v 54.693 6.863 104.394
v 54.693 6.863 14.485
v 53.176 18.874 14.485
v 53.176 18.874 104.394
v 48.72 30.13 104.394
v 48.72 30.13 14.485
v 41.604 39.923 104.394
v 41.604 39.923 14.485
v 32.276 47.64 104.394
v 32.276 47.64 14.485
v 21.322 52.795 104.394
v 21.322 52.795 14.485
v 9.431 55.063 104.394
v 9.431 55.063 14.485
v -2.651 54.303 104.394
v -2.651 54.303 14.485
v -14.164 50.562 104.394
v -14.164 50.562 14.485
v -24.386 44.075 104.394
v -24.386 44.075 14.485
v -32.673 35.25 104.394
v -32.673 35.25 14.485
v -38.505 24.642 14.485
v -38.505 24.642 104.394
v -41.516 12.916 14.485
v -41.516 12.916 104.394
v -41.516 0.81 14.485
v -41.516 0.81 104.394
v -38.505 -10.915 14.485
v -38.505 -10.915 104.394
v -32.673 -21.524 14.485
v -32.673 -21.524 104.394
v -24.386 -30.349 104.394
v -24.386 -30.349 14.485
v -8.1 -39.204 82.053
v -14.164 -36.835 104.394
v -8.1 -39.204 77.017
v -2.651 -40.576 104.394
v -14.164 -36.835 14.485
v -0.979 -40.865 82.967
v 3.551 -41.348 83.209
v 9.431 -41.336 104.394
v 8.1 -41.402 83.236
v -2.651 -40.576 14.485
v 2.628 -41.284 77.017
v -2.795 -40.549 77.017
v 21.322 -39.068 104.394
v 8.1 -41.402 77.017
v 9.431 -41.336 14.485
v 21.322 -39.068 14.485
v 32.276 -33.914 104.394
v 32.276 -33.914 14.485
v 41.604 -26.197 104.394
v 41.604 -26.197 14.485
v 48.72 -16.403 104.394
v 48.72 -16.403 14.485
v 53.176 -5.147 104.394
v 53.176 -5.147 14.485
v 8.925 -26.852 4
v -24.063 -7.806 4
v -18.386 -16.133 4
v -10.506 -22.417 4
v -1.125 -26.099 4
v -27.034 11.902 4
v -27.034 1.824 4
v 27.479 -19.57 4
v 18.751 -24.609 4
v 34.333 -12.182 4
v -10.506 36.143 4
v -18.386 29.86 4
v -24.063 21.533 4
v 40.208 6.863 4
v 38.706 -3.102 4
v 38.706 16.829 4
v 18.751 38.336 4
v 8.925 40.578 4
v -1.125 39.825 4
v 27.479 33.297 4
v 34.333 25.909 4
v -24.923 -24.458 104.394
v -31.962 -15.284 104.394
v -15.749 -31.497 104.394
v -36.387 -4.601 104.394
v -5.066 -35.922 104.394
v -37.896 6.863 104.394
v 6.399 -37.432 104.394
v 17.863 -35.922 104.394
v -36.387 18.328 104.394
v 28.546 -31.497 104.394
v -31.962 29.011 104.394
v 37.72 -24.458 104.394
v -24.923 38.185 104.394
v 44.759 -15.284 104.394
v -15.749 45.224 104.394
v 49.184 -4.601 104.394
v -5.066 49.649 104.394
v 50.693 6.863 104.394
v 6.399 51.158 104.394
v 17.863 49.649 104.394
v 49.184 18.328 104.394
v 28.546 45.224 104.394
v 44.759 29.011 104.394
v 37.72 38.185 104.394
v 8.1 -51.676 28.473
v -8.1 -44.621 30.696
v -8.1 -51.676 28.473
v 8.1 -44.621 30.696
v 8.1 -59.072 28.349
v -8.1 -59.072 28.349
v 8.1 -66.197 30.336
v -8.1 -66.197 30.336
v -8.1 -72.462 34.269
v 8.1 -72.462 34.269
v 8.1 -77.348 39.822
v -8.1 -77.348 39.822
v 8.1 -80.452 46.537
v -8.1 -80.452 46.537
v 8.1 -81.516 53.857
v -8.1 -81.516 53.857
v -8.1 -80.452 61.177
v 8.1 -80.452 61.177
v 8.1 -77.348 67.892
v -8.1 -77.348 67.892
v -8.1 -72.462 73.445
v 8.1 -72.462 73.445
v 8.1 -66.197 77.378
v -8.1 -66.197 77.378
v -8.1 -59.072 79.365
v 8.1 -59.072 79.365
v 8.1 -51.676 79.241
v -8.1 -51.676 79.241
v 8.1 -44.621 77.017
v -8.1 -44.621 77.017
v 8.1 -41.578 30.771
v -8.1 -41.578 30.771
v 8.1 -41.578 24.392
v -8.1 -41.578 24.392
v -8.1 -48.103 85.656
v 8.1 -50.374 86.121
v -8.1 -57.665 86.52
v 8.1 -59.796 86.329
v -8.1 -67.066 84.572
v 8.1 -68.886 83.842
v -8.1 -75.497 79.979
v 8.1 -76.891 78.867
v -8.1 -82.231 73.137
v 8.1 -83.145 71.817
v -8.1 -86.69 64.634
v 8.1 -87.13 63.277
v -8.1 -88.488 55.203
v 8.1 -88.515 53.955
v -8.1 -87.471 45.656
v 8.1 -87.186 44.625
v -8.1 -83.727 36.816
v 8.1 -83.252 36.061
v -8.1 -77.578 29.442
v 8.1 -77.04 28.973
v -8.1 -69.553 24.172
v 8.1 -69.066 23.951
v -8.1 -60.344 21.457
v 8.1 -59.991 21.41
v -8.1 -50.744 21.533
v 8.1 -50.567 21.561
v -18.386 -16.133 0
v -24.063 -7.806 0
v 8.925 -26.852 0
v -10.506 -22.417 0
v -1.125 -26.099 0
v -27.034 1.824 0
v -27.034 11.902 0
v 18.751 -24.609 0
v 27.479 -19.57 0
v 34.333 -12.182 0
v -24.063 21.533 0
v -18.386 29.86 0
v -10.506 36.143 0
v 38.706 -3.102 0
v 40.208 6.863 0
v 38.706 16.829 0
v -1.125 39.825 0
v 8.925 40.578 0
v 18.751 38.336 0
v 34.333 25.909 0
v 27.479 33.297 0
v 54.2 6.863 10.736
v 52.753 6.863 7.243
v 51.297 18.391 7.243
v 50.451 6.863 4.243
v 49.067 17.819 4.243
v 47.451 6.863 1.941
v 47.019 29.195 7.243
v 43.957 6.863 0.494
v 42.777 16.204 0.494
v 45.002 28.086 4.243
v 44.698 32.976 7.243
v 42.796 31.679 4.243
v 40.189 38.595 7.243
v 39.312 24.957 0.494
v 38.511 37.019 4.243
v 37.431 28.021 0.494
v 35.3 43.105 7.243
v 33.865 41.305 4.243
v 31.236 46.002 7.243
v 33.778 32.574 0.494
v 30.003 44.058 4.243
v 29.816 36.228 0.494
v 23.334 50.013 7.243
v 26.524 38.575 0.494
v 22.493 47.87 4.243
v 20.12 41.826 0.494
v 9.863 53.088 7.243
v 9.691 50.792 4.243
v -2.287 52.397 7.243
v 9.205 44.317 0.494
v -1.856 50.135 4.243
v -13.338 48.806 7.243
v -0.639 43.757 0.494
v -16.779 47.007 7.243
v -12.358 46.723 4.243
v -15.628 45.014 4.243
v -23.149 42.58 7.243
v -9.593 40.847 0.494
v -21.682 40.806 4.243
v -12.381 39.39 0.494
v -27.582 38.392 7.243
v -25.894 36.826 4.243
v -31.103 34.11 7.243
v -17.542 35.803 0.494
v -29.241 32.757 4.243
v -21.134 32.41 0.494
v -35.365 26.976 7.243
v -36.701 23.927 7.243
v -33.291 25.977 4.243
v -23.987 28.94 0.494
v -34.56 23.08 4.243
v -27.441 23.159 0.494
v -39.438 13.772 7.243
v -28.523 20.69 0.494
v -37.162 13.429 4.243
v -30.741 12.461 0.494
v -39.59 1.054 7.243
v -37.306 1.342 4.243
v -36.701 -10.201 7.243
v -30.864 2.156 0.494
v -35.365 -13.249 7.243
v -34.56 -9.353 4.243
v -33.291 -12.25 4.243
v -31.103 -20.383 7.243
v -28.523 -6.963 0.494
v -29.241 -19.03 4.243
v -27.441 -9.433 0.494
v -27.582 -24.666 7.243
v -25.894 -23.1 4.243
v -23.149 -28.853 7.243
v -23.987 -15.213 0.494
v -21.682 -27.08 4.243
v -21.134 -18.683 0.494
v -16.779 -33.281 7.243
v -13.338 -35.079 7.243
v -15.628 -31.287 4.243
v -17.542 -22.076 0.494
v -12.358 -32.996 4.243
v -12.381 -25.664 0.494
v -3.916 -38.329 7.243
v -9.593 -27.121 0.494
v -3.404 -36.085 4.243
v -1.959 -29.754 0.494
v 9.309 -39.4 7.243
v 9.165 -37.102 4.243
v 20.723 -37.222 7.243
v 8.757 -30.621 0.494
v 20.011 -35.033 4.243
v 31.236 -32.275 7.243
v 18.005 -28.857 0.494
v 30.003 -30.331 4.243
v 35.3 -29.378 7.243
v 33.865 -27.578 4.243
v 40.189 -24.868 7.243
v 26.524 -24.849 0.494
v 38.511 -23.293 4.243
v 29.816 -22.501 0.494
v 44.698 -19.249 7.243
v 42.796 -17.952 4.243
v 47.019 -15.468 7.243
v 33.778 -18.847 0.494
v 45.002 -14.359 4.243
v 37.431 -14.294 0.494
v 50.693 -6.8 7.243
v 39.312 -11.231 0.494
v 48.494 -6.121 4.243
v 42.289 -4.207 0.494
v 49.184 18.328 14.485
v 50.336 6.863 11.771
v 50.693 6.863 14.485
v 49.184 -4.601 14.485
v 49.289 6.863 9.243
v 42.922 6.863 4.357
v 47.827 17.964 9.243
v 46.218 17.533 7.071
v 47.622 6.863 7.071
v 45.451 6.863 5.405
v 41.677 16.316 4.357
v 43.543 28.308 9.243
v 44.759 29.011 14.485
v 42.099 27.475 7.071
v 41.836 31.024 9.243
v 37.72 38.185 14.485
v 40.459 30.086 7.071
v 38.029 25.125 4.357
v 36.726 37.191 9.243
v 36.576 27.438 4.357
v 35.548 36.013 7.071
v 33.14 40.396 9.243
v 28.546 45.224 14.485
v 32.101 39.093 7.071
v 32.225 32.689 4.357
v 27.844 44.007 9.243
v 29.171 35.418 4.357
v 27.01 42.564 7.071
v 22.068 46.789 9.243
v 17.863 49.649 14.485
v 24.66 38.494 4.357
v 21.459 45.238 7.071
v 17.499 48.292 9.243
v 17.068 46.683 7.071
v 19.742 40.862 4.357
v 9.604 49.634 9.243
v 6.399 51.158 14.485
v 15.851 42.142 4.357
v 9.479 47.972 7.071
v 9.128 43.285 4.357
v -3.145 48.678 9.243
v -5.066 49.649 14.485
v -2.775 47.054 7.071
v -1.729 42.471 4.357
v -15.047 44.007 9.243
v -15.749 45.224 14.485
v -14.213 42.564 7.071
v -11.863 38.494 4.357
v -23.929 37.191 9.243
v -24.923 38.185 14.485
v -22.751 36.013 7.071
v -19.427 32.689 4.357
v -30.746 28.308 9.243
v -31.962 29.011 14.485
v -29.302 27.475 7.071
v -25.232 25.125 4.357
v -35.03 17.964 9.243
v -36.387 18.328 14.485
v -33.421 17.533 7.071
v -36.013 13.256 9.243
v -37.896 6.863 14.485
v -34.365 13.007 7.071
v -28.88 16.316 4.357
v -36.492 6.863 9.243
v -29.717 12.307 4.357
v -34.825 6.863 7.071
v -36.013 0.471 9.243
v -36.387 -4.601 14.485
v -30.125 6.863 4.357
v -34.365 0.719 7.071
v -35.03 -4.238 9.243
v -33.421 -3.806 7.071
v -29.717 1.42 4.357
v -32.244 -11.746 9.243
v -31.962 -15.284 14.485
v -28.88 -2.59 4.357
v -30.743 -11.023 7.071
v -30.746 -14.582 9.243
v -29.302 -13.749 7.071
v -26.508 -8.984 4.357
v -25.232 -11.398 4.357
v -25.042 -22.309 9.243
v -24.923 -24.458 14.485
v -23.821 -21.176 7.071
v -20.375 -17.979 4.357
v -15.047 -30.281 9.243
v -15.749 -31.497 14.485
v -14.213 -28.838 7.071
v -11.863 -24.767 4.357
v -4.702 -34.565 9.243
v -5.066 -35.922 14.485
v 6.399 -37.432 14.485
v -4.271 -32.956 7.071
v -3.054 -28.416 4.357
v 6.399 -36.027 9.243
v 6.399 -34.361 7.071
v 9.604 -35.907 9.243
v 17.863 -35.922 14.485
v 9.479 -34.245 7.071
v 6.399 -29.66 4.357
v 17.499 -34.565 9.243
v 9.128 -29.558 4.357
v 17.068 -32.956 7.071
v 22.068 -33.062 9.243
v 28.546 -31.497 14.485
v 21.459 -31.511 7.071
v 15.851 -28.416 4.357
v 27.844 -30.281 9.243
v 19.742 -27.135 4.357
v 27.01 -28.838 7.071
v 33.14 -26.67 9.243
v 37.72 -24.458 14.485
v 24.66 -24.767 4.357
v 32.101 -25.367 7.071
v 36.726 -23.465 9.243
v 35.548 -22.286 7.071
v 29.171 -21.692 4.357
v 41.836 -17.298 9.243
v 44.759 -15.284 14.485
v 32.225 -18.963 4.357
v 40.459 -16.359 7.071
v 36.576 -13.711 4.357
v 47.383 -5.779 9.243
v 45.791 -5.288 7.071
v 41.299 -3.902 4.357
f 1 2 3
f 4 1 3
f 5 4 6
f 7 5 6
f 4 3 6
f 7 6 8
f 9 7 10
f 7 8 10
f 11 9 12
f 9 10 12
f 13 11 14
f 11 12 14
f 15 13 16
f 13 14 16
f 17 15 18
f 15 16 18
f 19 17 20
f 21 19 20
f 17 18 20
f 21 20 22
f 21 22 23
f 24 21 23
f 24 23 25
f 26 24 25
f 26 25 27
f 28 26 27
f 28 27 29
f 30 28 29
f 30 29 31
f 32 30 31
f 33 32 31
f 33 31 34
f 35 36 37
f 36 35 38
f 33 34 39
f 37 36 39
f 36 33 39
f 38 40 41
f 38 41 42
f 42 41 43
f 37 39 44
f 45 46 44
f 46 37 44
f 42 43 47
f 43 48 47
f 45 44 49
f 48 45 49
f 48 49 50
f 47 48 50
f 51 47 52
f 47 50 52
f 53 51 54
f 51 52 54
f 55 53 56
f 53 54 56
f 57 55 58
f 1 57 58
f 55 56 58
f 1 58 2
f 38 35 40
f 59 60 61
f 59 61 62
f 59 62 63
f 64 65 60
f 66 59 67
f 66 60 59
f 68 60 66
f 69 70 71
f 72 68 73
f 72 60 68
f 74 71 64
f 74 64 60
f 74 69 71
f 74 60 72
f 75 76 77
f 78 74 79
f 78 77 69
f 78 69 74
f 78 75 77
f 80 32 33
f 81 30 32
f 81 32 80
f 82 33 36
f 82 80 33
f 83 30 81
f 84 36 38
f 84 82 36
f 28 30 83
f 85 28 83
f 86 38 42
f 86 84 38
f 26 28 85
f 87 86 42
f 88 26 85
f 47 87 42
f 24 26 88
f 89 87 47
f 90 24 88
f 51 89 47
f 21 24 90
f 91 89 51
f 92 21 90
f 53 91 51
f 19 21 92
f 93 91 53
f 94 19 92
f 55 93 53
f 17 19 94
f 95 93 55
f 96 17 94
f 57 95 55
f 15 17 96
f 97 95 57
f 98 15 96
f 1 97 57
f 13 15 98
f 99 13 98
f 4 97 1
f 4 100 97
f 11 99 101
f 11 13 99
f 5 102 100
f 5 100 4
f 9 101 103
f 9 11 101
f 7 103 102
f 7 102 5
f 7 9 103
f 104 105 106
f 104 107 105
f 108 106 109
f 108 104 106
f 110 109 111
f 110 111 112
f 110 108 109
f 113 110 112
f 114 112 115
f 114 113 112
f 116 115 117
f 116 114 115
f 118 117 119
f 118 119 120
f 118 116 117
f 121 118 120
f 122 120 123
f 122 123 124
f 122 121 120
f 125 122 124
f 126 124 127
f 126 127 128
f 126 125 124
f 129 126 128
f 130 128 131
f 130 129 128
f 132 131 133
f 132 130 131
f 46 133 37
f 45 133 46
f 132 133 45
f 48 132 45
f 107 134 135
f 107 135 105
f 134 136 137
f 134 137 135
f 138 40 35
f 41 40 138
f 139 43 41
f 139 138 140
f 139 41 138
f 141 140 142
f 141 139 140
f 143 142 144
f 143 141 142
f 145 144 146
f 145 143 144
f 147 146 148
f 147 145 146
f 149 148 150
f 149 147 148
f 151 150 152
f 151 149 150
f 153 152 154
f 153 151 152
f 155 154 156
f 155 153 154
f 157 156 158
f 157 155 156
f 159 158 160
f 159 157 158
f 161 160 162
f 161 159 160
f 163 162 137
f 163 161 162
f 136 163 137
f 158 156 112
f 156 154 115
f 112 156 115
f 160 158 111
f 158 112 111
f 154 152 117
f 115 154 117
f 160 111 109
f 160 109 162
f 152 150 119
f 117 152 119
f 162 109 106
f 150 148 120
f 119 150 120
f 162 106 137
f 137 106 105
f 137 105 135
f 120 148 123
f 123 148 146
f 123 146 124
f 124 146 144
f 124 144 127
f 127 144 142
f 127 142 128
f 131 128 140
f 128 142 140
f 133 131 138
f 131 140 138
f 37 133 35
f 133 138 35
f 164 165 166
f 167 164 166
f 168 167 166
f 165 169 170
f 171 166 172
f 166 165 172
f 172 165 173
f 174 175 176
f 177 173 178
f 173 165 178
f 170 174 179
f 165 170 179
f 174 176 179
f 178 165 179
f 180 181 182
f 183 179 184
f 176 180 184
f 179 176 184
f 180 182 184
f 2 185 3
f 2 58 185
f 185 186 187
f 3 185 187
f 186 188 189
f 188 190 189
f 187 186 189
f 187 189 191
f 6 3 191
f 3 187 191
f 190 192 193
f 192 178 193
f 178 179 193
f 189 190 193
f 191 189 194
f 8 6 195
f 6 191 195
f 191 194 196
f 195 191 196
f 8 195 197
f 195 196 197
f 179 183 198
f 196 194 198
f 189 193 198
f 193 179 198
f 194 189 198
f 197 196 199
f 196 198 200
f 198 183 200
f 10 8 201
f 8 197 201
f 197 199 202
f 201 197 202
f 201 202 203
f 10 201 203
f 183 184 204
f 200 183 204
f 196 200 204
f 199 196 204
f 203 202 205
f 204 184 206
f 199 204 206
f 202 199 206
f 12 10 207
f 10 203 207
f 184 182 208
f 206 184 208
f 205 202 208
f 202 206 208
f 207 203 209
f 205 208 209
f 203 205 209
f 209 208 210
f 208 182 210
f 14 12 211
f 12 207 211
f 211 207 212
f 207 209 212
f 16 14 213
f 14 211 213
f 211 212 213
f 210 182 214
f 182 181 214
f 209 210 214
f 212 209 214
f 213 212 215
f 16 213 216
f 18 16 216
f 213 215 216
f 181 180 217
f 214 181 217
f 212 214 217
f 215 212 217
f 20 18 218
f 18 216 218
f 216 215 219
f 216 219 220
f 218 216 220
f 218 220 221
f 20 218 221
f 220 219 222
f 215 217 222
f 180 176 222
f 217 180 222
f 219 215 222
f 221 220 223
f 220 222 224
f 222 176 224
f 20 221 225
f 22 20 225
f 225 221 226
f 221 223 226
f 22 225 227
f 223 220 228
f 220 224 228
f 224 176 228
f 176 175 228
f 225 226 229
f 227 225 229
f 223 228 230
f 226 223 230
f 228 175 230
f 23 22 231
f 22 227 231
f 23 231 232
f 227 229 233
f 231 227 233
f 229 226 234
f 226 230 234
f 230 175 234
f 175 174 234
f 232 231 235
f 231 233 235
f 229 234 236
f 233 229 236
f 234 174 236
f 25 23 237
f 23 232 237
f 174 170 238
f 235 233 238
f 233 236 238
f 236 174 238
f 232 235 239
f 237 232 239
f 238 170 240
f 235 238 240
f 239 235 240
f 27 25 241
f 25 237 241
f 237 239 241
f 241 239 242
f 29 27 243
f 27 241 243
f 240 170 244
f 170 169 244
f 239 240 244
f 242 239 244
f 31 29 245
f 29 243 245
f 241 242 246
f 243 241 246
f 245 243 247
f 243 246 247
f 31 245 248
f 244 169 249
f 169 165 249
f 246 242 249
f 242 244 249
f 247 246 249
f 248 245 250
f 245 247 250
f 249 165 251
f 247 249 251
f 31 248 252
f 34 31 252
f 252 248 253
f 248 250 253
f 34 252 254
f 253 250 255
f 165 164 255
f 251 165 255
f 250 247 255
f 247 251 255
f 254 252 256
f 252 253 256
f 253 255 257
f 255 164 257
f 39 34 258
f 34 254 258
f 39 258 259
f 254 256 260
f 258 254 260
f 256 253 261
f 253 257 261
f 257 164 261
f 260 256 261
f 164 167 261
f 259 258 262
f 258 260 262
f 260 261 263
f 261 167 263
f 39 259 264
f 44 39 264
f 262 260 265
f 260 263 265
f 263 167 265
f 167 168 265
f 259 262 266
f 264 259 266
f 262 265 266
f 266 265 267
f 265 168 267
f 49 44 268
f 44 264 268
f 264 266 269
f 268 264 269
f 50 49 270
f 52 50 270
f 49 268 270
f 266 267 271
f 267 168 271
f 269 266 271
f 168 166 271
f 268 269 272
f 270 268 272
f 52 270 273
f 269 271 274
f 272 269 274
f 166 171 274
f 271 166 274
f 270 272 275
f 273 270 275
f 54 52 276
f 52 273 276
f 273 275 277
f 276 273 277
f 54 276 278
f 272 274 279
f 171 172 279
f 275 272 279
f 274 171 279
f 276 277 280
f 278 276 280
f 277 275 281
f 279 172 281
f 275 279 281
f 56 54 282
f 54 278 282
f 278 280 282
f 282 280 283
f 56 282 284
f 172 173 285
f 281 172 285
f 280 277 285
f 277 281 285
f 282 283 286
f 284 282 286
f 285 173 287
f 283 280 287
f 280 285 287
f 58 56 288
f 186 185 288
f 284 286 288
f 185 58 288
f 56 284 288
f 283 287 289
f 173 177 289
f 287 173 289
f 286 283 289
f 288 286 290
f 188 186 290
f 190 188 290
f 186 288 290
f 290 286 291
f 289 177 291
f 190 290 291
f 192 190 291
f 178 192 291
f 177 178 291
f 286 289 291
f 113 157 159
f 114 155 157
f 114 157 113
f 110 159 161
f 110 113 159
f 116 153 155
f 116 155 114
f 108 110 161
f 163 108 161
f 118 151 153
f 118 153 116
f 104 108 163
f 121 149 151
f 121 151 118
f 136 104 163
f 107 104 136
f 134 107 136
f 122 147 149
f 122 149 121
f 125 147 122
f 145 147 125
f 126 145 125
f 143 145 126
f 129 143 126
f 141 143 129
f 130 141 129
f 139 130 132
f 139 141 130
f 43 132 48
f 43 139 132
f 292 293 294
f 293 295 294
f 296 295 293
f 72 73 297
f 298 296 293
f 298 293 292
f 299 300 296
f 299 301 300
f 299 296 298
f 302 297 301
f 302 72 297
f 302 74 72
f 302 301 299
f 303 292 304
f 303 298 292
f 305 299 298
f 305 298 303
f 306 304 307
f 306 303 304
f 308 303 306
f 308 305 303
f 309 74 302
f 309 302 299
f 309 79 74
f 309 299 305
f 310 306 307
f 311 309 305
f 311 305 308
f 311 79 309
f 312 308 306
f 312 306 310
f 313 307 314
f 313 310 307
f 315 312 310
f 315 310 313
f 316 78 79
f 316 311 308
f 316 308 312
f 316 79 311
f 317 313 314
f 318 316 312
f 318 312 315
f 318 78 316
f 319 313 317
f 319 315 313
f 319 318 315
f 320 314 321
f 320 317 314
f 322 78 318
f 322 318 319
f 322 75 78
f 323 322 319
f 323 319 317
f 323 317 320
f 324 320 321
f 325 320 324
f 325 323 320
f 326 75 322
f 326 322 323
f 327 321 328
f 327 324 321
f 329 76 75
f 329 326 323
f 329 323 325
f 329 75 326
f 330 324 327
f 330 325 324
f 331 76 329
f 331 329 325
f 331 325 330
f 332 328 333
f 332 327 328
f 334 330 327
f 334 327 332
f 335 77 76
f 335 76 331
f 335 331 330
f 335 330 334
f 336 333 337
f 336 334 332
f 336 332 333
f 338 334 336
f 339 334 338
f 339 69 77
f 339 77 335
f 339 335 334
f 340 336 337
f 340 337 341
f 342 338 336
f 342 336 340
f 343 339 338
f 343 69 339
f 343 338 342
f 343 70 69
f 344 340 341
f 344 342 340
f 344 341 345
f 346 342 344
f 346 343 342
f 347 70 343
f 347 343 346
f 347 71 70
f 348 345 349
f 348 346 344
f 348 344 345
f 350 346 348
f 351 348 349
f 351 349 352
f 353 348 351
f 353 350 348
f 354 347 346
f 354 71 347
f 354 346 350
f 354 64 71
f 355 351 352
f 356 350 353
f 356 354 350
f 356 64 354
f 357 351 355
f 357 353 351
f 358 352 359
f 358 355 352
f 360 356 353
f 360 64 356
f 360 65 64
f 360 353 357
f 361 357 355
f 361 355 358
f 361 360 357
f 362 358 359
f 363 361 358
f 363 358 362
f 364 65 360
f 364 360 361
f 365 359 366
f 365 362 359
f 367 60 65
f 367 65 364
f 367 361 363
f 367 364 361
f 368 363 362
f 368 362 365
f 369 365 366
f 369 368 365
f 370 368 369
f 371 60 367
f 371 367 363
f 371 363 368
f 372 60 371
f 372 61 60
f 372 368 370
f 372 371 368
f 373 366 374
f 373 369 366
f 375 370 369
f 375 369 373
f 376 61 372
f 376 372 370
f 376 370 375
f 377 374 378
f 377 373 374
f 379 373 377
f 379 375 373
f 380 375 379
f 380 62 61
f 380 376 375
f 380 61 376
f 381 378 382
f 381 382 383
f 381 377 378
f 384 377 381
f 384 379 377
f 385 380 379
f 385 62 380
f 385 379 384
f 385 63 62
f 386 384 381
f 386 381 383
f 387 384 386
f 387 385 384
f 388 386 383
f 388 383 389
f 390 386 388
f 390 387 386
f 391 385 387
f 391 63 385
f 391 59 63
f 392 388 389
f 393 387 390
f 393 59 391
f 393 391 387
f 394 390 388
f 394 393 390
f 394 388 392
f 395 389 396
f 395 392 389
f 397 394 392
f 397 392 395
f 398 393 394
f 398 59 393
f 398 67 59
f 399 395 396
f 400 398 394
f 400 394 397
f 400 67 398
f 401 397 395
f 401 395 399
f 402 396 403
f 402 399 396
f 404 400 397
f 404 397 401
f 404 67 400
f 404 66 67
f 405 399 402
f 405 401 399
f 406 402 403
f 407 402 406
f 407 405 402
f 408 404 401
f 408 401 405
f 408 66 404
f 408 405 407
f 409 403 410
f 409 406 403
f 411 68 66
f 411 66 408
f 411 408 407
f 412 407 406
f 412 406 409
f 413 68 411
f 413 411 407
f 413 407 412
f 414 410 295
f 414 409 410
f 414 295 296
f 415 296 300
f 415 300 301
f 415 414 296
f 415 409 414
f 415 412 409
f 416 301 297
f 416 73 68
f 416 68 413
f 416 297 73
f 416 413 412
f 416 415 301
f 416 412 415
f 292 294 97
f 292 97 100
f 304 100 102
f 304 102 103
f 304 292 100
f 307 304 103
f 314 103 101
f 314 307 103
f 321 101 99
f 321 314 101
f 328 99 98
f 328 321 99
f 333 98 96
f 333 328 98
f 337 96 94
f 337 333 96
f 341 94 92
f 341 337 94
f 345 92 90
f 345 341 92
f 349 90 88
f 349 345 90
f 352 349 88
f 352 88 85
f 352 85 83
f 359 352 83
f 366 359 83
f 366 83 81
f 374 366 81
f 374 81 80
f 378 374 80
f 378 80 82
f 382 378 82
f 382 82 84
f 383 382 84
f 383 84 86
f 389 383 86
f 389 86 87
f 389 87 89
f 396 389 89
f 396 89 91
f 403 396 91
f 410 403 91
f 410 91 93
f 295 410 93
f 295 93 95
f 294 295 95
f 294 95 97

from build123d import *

# Parameters (mm, degrees)
F0_R     = 48.2949752594
F1_DEPTH = 104.394
F2_R     = 14.4852813742
F3_T     = -4
F6_DEPTH = 8.1


# Not quite as in the source:
# - a feature of the source that left no trace in its solid (it failed there, or was rolled back) is left out


with BuildPart() as f1:
    # F0 (on Top) → F1 (new body)
    with BuildSketch(Plane.XY):
        with Locations((6.398510754, 6.8632753311)):
            Circle(F0_R)
    extrude(amount=F1_DEPTH)

    # F2
    f2_edges = [f1.edges().sort_by_distance(p)[0] for p in [
        (-41.896465, 6.863275, 0),
    ]]
    fillet(f2_edges, radius=F2_R)

    # F3
    f3_openings = [f1.faces().sort_by_distance(p)[0] for p in [
        (6.398511, 6.863275, 104.394),
    ]]
    offset(amount=F3_T, openings=f3_openings)

    # F5 (on Right) → F6 (join, symmetric)
    with BuildSketch(Plane.YZ):
        with BuildLine():
            Line((-38.8429239392, 77.0174632754), (-38.8429239392, 81.8370801914))
            ThreePointArc((-38.8429239392, 81.8370801914), (-88.478602233, 55.4130888204), (-41.5783710778, 24.392189458))
            Line((-41.5783710778, 24.392189458), (-41.5783710778, 30.7706389778))
            Line((-41.5783710778, 30.7706389778), (-44.6209337434, 30.6963794891))
            ThreePointArc((-44.6209337434, 30.6963794891), (-81.5156325698, 53.8569213822), (-44.6209337434, 77.0174632754))
            Line((-44.6209337434, 77.0174632754), (-38.8429239392, 77.0174632754))
        make_face()
    extrude(amount=F6_DEPTH, both=True)


solid = f1.part
